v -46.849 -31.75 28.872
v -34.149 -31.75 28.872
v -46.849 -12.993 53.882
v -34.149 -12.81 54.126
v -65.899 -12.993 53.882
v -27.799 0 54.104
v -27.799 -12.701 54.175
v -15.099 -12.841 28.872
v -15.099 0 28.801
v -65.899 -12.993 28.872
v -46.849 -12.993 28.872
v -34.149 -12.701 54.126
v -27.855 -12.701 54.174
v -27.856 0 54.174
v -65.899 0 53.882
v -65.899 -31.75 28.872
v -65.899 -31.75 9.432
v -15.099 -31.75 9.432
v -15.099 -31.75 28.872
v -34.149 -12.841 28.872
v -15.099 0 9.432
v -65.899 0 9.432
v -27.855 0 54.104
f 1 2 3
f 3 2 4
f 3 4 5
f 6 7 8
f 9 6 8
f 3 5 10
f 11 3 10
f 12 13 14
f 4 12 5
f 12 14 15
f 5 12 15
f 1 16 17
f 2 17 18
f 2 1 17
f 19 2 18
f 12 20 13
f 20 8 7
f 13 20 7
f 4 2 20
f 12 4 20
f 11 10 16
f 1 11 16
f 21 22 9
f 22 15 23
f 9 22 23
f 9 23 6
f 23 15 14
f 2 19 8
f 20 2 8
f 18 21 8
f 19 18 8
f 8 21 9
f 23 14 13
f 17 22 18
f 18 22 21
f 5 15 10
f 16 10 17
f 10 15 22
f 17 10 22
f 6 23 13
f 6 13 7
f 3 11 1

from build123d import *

# Parameters (mm, degrees)
F1_DEPTH  = 31.75
F3_DEPTH  = 50.801
F5_DEPTH  = 19.05
F7_DEPTH  = 19.05
F10_DEPTH = 25.4


with BuildPart() as f1:
    # F0 (on Front) → F1 (new body)
    with BuildSketch(Plane.XZ):
        Polygon((-15.0988876544, 54.272421198), (-65.8988876544, 53.8816550068), (-65.8988876544, 9.4316550068), (-15.0988876544, 9.4316550068), align=None)
    extrude(amount=F1_DEPTH)

    # F2 (on face) → F3 (cut, through all)
    with BuildSketch(Plane.YZ.offset(-15.0988876544)):
        Polygon((-12.7, 54.272421198), (-31.75, 54.272421198), (-31.75, 28.872421198), align=None)
    extrude(amount=-F3_DEPTH, mode=Mode.SUBTRACT)

    # F4 (on face) → F5 (cut)
    with BuildSketch(Plane.YZ.offset(-15.0988876544)):
        Polygon((-12.7, 54.272421198), (-31.75, 28.872421198), (-12.8411110491, 28.872421198), align=None)
    extrude(amount=-F5_DEPTH, mode=Mode.SUBTRACT)

    # F6 (on face) → F7 (cut)
    with BuildSketch(Plane(origin=(-65.8988876544, 0, 0), x_dir=(0, -1, 0), z_dir=(-1, 0, 0))):
        Polygon((31.75, 28.872421198), (12.9930746434, 53.8816550068), (12.9930746434, 28.872421198), align=None)
    extrude(amount=-F7_DEPTH, mode=Mode.SUBTRACT)

    # F8 (on face) + F9 (on face) → F10 (cut)
    with BuildSketch(Plane(origin=(0, -13.00111205, 0.0722283685), x_dir=(1, 0, 0), z_dir=(0, -0.9999845683, 0.0055554674))):
        Polygon((-15.0988876544, 28.800637273), (-15.0988876544, 54.201029245), (-27.7985119257, 54.1033390799), align=None)
    with BuildSketch(Plane(origin=(-0.4183455733, 0, 54.3853475663), x_dir=(0.999970416, 0, 0.0076920203), z_dir=(-0.0076920203, 0, 0.999970416))):
        Polygon((-27.4383474236, 0), (-27.4378046857, -12.700545143), (-14.6809764035, -12.7), (-14.6809764035, 0), align=None)
    extrude(amount=-F10_DEPTH, dir=(0, -0.9999845683, 0.0055554674), mode=Mode.SUBTRACT)


solid = f1.part
